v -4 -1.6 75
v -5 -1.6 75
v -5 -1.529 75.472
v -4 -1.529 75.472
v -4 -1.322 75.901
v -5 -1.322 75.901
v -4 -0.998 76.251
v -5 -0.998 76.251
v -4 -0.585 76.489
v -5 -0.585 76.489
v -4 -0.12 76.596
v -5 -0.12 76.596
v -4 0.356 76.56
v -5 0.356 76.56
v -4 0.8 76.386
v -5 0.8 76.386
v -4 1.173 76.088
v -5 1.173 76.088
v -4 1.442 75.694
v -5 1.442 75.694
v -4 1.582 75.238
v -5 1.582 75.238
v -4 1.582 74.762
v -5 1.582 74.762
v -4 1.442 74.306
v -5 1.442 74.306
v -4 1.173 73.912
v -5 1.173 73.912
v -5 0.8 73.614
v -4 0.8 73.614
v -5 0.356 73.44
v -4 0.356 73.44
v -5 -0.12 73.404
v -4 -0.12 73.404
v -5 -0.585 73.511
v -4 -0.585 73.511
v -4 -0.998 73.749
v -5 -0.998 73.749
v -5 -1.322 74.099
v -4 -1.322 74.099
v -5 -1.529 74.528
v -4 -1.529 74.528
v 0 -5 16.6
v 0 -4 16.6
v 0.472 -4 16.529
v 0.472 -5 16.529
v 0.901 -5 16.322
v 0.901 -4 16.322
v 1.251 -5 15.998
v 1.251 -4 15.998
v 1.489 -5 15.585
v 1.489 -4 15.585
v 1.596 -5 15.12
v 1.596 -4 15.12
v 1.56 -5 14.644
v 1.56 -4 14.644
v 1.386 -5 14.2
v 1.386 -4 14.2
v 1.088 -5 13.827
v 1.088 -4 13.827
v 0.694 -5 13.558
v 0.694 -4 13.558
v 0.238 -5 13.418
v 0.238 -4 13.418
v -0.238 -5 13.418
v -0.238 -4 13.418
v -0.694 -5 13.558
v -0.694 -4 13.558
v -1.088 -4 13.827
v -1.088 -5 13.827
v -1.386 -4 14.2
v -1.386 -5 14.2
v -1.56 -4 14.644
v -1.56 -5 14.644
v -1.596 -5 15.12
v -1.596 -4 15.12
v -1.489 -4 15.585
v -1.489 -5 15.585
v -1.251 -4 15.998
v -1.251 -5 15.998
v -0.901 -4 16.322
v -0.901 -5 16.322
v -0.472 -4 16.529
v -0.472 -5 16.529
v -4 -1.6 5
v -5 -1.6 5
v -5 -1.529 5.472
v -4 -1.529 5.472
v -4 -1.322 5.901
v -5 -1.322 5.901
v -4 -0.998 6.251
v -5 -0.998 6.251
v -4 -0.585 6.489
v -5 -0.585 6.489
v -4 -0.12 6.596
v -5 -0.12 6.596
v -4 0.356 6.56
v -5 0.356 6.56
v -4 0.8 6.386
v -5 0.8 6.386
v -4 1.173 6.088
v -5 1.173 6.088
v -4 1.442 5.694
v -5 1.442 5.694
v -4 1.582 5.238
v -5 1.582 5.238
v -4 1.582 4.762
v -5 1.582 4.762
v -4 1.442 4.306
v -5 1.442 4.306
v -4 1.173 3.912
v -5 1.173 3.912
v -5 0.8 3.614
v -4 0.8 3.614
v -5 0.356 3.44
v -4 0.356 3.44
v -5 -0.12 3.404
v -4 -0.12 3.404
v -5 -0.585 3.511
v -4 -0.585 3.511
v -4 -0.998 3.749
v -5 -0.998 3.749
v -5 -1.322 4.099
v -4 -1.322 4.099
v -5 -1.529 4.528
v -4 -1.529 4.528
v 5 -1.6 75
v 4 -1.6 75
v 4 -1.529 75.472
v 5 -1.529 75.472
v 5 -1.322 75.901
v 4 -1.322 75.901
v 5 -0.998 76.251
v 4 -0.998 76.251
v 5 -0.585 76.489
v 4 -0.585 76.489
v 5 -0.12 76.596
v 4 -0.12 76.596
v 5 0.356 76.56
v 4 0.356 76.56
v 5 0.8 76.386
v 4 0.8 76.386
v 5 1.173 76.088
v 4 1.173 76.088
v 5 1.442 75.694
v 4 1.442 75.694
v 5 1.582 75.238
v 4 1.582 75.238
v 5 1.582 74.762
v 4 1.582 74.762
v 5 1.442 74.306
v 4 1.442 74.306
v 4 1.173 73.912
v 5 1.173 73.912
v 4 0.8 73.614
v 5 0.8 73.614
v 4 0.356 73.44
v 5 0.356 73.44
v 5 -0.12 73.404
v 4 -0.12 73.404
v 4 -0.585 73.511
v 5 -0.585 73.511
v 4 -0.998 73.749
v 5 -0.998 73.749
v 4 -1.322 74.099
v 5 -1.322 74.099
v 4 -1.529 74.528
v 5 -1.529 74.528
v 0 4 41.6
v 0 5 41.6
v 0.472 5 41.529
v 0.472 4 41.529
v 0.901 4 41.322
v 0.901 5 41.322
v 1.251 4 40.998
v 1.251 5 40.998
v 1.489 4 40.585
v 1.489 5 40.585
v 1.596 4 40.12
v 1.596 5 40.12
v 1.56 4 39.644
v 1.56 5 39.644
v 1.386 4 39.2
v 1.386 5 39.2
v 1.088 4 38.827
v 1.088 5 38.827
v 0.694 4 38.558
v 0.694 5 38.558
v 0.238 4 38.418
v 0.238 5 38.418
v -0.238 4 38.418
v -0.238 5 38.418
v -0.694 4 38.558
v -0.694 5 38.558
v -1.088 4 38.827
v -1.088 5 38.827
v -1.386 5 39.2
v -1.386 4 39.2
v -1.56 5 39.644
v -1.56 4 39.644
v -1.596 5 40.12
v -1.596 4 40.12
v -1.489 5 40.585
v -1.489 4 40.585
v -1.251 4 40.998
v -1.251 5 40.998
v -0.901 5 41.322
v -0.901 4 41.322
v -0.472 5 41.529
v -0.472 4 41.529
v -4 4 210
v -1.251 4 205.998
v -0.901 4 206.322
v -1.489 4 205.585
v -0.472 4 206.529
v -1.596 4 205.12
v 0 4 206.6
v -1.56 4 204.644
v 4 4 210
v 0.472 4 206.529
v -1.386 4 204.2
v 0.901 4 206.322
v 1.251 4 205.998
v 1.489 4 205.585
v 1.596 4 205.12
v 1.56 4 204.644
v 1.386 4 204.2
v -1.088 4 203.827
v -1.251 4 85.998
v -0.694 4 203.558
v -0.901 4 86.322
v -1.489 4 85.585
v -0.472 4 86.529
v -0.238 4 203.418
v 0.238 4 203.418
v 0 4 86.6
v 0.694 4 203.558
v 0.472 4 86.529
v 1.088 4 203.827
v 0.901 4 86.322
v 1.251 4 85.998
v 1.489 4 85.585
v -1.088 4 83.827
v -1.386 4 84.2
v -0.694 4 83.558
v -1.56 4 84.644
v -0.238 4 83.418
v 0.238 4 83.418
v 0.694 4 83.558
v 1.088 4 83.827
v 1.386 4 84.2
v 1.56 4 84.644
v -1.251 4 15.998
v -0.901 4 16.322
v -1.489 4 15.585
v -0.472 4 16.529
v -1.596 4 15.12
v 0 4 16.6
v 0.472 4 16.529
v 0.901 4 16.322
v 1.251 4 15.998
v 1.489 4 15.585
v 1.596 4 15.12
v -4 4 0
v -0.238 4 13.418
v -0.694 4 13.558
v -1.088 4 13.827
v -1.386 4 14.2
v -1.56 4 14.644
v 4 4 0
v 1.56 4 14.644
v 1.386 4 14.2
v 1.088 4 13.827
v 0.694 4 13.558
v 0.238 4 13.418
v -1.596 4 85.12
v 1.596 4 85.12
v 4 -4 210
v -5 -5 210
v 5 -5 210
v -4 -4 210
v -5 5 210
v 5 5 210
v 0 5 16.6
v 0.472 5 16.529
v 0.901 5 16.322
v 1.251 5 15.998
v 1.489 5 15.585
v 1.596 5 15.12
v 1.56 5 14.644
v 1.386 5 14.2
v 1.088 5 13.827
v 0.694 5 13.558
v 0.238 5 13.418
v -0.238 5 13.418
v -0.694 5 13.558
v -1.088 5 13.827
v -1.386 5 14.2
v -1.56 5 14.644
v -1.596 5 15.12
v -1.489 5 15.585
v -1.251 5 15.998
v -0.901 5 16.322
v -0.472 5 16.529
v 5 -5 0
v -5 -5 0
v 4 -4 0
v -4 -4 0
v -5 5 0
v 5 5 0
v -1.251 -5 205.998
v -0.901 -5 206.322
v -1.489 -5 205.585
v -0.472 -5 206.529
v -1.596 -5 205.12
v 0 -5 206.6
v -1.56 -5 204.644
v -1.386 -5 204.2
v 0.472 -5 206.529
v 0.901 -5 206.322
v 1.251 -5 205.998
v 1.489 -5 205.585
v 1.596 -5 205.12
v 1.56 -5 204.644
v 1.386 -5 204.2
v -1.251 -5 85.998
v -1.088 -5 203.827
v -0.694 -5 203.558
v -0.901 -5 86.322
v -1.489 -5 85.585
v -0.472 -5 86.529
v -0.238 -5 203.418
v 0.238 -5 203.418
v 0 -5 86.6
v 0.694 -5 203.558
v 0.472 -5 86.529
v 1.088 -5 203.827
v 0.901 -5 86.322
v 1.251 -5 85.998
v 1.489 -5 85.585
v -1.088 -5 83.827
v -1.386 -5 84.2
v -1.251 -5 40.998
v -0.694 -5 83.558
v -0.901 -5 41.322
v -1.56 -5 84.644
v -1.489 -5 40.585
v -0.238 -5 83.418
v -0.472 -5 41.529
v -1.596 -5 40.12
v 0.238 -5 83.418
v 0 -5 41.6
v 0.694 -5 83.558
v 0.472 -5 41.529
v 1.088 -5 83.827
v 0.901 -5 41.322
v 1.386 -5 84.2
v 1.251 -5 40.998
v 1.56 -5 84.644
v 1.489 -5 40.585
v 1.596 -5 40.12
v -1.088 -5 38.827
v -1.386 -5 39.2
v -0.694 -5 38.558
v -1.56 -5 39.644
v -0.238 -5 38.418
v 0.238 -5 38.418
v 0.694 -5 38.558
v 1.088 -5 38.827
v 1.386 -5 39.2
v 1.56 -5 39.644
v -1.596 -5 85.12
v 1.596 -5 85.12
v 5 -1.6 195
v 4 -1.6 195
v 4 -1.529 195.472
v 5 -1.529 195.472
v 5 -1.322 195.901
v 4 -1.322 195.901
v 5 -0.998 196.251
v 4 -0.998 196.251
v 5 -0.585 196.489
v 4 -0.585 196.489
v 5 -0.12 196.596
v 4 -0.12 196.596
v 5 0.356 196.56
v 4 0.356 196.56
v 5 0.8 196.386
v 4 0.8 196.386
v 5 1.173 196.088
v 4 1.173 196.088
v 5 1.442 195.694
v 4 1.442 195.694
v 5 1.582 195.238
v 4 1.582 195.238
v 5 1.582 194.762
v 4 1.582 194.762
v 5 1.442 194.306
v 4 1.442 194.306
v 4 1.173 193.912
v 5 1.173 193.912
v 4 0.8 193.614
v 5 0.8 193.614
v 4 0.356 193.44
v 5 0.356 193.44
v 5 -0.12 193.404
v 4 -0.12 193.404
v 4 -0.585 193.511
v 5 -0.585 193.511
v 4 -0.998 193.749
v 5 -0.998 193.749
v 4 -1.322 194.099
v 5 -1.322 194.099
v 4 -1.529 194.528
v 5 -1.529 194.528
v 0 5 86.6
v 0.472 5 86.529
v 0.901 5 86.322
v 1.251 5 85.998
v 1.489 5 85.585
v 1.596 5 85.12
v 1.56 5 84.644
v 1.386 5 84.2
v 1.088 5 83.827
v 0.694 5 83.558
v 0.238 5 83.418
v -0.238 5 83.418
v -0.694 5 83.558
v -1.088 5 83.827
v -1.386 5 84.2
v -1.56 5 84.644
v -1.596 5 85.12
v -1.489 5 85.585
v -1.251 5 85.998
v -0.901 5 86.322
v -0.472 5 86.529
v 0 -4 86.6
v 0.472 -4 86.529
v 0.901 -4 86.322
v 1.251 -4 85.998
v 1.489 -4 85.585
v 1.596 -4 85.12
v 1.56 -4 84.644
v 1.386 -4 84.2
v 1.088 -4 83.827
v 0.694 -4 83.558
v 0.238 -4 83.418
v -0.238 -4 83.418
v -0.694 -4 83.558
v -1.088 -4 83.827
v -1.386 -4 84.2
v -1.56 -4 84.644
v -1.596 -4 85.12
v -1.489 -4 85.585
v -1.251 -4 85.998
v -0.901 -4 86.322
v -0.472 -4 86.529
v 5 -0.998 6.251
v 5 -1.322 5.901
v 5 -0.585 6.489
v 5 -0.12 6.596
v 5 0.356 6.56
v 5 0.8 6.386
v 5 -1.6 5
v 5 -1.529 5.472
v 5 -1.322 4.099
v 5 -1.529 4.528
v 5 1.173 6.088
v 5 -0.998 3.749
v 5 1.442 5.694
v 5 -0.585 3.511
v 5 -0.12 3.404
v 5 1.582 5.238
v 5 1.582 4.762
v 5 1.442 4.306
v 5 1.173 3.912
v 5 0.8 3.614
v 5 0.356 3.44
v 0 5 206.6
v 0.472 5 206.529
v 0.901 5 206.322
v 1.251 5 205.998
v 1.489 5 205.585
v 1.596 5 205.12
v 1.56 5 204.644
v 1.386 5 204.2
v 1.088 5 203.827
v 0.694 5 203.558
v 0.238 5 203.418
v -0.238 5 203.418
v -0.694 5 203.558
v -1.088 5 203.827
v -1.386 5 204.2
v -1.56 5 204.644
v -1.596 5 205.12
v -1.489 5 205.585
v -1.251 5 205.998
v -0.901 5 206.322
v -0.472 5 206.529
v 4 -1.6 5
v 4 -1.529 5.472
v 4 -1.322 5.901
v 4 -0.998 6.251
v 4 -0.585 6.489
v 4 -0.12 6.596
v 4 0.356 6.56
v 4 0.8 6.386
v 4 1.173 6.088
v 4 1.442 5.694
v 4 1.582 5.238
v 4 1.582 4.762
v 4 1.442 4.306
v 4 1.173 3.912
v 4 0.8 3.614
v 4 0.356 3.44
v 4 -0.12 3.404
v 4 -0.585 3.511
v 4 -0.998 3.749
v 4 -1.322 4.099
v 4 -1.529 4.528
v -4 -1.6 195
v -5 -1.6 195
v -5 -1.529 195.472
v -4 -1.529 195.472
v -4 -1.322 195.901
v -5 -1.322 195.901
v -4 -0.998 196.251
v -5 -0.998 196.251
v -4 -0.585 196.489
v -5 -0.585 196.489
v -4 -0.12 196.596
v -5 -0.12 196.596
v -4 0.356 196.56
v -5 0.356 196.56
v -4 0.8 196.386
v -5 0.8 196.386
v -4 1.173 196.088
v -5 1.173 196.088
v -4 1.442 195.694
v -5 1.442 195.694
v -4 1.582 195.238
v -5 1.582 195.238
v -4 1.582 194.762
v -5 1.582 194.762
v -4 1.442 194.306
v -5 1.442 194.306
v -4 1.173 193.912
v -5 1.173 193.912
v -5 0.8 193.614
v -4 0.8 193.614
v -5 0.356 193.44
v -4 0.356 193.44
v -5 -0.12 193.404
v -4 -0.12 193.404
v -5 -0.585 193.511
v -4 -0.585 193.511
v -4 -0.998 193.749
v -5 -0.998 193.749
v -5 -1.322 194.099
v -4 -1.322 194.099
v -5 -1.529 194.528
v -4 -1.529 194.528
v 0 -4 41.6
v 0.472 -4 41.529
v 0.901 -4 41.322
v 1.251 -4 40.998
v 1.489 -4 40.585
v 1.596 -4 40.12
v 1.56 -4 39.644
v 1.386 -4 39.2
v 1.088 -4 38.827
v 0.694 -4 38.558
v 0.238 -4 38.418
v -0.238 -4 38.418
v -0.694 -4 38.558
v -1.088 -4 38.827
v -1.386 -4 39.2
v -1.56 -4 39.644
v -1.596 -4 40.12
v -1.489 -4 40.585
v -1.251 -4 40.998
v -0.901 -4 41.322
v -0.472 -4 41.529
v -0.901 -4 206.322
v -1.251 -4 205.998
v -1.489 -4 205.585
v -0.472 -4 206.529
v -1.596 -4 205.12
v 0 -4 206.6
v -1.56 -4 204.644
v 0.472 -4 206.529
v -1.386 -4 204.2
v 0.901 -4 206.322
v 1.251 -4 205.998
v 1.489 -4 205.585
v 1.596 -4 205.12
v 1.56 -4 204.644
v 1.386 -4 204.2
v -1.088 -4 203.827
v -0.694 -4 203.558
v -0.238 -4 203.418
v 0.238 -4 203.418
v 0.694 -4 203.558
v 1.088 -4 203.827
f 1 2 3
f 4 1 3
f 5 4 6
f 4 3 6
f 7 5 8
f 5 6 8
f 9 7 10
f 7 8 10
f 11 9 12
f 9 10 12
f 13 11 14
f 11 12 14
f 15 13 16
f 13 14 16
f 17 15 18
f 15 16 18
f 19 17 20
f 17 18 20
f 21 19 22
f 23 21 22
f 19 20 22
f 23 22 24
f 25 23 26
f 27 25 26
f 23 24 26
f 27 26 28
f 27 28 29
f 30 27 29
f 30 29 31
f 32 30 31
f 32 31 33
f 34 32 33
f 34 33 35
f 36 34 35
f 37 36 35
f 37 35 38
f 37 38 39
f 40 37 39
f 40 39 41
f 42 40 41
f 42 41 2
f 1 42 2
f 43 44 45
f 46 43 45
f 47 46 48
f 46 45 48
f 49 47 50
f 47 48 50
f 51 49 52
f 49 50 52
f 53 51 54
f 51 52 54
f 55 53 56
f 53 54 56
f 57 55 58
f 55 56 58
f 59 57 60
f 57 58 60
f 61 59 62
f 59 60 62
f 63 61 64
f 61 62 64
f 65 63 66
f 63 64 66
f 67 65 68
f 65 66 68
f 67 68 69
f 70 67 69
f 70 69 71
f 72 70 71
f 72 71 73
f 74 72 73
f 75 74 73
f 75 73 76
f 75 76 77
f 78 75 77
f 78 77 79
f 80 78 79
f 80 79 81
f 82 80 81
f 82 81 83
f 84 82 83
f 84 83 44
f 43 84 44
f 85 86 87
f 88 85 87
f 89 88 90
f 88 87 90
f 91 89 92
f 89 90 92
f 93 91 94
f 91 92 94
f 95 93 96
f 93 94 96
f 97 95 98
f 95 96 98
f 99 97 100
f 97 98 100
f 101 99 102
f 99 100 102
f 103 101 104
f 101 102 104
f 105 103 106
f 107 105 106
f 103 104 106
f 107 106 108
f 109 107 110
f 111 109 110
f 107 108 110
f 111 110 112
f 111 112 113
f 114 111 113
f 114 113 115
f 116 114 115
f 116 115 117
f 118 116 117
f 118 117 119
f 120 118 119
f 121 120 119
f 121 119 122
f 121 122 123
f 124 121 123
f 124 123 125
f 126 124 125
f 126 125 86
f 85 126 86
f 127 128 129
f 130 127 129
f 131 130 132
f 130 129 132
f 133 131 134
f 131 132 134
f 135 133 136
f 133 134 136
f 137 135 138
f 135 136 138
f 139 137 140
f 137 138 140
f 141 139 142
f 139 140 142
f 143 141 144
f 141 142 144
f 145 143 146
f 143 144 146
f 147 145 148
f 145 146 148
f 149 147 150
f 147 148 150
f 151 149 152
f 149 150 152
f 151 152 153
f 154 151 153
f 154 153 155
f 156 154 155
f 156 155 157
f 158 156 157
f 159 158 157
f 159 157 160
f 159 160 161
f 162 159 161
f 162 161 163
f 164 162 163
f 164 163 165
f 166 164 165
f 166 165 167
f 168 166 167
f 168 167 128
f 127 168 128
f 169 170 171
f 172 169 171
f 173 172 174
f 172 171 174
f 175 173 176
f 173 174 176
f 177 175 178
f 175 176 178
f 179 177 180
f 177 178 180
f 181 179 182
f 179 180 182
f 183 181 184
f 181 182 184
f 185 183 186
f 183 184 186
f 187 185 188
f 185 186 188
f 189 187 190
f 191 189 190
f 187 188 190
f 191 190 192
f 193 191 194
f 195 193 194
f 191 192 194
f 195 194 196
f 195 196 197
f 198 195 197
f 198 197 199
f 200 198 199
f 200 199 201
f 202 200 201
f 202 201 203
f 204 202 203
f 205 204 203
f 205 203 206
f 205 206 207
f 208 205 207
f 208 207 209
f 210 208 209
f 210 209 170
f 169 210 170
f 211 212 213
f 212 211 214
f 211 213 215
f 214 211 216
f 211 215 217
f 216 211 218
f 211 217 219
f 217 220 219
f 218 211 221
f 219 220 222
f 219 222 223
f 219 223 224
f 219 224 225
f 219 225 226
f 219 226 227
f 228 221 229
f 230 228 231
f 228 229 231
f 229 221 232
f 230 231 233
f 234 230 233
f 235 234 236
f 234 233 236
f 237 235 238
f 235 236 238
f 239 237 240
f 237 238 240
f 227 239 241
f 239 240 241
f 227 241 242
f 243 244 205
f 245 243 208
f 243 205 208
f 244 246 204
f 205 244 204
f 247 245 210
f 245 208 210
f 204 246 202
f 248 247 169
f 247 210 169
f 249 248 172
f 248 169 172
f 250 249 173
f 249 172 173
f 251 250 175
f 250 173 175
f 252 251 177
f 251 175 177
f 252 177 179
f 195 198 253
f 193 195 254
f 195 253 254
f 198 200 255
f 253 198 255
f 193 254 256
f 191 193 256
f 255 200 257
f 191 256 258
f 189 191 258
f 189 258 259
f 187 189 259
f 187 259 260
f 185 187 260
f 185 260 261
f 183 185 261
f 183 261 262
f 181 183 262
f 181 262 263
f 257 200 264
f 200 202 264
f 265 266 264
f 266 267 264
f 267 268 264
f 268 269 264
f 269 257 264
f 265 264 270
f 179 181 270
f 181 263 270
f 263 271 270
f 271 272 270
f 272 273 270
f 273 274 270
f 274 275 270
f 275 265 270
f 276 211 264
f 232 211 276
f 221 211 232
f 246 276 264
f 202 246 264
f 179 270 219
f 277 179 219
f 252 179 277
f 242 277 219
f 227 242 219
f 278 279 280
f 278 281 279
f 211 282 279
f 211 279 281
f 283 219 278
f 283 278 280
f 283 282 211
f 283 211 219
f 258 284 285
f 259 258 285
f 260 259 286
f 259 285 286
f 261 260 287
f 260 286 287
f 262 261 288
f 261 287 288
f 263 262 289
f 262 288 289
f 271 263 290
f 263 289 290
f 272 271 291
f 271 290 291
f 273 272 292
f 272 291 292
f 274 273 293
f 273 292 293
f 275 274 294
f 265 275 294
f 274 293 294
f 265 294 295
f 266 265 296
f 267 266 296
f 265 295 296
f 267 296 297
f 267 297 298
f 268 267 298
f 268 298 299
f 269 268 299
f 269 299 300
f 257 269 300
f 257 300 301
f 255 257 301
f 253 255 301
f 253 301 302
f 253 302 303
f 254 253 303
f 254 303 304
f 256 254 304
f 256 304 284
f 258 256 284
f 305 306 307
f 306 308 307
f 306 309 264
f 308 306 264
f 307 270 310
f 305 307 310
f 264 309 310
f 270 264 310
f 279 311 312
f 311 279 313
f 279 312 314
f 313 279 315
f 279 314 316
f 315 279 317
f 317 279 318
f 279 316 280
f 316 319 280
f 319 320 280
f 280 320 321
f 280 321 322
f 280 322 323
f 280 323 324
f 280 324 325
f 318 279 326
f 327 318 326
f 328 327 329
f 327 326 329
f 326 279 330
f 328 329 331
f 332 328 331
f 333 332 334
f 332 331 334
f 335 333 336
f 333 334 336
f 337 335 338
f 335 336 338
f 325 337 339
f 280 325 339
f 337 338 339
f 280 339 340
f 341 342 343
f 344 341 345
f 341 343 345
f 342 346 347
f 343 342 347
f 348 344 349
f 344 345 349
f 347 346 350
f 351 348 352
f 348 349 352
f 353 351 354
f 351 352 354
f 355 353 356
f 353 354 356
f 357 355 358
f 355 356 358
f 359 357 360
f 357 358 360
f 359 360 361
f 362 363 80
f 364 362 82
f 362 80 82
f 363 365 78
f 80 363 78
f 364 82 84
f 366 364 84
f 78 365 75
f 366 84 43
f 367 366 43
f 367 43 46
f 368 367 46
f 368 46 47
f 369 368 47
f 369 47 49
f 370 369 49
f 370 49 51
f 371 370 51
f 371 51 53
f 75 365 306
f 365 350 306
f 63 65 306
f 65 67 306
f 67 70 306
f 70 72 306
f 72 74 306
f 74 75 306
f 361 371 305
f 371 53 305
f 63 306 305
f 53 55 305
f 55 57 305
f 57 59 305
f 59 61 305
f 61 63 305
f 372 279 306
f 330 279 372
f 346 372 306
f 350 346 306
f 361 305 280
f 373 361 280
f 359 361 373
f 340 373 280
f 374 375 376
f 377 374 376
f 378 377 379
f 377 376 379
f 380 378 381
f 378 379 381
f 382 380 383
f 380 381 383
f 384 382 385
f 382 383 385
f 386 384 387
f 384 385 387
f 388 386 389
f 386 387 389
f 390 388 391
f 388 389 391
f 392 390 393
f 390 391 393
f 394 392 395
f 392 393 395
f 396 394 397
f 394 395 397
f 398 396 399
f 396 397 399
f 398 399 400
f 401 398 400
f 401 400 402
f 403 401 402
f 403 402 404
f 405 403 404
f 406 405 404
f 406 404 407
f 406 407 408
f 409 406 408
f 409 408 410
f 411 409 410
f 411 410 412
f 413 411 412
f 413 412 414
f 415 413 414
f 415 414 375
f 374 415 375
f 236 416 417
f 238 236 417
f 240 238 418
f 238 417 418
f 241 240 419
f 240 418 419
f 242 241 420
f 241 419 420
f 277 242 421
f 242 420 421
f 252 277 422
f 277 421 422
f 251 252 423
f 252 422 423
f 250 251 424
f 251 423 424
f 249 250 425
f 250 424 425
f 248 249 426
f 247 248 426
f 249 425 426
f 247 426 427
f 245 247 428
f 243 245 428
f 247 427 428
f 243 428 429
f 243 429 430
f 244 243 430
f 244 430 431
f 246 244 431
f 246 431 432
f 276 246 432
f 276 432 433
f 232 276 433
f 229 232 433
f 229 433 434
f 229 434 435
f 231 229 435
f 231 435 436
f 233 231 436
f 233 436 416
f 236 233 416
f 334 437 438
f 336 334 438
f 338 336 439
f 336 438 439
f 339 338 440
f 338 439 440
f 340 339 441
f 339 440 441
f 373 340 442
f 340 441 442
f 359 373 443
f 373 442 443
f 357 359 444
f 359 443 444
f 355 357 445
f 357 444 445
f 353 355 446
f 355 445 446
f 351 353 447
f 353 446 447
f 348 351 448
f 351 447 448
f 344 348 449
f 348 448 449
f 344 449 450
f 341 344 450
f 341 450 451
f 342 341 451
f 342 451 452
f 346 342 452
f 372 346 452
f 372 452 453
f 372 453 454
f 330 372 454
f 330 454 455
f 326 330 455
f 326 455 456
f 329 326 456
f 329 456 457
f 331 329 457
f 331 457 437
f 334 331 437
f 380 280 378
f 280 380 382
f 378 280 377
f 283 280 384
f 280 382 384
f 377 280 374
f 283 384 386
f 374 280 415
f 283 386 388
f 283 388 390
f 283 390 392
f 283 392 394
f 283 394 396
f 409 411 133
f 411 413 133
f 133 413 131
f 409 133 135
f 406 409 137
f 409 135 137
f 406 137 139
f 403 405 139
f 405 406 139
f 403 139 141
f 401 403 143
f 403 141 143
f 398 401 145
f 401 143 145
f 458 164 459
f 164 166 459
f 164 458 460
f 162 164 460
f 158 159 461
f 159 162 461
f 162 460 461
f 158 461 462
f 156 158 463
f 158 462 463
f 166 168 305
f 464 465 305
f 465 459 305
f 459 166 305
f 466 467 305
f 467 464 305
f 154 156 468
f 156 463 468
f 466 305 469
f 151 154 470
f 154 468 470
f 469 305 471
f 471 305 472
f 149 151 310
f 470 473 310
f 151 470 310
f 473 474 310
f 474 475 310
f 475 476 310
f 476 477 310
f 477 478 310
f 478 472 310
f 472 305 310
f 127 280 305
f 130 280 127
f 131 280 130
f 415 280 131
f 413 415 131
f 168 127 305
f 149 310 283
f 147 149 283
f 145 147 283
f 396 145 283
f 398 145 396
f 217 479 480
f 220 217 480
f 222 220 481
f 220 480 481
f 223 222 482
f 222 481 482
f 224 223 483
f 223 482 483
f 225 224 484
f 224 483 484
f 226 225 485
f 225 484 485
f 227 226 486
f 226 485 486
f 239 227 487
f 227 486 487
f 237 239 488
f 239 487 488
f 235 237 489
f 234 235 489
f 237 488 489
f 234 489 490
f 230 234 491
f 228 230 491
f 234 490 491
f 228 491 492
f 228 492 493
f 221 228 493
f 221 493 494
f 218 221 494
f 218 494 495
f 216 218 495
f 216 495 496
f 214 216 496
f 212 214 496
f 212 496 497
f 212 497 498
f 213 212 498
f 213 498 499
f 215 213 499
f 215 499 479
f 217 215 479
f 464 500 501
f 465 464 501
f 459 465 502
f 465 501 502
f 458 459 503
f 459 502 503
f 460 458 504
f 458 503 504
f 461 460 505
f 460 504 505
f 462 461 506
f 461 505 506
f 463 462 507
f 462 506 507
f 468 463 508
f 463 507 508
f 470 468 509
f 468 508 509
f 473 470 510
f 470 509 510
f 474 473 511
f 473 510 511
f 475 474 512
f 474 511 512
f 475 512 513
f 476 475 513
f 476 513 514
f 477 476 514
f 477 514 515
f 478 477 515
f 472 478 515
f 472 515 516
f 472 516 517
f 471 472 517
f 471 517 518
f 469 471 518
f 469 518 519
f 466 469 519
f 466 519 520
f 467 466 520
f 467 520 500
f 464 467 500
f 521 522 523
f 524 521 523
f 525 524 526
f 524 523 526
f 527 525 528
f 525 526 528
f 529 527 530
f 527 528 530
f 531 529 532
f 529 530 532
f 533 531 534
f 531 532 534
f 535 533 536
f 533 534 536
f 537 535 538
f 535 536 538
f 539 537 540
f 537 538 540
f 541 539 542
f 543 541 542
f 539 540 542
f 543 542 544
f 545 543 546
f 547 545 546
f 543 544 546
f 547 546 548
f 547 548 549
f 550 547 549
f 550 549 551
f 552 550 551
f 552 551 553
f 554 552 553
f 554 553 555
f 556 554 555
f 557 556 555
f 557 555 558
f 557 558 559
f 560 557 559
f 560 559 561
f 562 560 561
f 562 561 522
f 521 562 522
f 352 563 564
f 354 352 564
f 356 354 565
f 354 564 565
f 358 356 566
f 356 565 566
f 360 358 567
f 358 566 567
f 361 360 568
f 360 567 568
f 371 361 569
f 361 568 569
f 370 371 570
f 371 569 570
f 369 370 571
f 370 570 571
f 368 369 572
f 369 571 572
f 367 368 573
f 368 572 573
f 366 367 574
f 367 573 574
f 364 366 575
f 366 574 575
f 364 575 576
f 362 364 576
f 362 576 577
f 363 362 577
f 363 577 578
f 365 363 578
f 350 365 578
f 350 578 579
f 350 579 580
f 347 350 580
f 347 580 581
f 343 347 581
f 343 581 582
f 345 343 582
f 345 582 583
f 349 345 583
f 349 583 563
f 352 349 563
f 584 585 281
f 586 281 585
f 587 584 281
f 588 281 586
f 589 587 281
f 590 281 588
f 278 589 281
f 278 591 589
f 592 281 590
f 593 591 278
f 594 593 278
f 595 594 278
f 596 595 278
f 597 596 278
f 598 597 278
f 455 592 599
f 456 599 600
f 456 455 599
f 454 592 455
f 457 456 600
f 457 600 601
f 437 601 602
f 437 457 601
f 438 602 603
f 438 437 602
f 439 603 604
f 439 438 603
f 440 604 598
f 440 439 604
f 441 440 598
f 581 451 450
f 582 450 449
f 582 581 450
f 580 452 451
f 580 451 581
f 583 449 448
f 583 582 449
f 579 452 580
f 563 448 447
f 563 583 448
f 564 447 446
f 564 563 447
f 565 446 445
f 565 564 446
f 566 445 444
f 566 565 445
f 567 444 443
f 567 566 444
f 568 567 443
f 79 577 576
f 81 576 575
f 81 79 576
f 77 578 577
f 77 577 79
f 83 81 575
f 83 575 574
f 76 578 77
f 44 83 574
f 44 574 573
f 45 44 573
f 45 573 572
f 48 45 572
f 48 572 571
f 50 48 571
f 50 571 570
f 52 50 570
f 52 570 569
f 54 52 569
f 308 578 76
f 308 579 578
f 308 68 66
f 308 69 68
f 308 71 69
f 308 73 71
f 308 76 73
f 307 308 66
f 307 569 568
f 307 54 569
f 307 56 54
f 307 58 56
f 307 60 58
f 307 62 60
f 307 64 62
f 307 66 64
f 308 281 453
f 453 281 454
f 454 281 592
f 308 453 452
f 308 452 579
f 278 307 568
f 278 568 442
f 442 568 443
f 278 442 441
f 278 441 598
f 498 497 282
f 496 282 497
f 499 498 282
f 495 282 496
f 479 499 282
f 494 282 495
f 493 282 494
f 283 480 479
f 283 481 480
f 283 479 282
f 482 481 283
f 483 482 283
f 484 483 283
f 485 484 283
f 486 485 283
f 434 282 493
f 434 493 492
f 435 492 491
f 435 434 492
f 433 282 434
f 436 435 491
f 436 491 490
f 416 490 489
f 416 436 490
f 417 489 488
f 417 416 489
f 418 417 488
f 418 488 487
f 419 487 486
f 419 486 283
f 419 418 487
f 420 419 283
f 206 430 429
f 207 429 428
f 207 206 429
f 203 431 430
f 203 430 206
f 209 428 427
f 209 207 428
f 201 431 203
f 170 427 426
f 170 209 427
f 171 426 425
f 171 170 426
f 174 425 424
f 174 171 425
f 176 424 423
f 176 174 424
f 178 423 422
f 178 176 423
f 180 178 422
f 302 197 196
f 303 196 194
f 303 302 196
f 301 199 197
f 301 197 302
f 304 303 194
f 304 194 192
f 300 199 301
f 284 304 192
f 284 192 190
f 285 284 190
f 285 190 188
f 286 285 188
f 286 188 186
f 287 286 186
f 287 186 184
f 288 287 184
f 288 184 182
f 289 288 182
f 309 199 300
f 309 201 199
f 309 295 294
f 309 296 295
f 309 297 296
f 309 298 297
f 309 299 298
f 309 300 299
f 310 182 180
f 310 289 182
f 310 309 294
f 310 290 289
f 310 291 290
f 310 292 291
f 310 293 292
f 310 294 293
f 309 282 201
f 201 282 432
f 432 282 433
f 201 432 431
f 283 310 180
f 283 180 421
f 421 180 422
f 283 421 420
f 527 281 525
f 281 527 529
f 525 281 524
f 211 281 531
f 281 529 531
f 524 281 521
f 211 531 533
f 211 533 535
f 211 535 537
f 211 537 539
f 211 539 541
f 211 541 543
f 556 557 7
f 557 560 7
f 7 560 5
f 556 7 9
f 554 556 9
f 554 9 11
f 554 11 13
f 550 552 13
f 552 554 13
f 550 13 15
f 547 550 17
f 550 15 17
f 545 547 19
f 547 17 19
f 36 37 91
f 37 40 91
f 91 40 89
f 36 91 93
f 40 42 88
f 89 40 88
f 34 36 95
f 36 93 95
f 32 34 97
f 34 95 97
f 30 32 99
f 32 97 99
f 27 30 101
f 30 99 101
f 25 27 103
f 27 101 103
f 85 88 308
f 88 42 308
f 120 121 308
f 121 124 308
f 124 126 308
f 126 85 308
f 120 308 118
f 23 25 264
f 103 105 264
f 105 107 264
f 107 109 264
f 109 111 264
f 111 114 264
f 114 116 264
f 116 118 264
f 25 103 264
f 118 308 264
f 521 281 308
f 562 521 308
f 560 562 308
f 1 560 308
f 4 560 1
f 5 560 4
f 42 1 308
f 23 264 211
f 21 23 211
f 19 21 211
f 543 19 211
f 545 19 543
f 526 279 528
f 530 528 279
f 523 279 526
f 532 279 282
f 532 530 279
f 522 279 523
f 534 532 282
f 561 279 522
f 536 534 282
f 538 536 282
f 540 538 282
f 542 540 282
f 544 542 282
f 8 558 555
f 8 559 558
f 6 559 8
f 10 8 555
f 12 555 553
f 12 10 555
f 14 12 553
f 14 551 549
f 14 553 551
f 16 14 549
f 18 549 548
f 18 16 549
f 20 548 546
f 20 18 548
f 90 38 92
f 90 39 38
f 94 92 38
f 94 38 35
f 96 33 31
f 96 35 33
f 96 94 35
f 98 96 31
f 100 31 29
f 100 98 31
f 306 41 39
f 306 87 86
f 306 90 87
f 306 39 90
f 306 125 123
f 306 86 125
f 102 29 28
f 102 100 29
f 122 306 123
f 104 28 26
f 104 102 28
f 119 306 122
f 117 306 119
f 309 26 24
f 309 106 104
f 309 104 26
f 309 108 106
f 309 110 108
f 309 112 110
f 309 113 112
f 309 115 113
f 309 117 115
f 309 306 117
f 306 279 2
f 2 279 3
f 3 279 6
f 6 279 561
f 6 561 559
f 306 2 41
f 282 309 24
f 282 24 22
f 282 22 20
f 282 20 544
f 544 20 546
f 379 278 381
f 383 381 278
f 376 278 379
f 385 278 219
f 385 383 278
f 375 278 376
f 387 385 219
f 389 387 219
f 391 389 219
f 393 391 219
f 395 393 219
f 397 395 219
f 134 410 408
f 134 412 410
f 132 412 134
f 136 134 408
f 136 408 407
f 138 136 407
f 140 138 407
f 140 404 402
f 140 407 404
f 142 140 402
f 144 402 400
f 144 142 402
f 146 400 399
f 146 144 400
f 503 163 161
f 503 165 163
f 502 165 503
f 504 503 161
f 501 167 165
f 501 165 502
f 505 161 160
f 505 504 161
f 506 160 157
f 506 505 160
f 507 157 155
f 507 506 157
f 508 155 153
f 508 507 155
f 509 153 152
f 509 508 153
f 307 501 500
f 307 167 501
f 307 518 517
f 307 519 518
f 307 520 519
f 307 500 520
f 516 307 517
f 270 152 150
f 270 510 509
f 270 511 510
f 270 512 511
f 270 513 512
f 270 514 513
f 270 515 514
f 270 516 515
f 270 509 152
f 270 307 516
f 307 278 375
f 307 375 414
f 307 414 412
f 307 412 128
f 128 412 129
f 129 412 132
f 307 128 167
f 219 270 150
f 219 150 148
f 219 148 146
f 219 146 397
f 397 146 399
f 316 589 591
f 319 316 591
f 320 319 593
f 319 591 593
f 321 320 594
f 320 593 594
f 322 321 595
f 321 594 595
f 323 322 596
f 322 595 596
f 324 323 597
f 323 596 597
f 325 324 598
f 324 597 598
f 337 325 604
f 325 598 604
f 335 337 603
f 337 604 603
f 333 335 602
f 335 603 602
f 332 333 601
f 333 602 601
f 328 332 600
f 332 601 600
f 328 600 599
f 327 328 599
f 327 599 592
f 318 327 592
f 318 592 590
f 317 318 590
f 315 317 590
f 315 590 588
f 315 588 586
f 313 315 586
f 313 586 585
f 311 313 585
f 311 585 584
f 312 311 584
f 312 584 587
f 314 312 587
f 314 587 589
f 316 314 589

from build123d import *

# Parameters (mm, degrees)
SKETCH_1_W          = 10
SKETCH_1_H          = 10
SKETCH_1_W_2        = 8
SKETCH_1_H_2        = 8
EXTRUDE_1_DEPTH     = 210
SKETCH_2_R          = 1.6
CUT_EXTRUDE_1_DEPTH = 211.297408448
SKETCH_3_R          = 1.6
CUT_EXTRUDE_2_DEPTH = 211.297408448
SKETCH_4_R          = 1.6
CUT_EXTRUDE_3_DEPTH = 211.297408448


with BuildPart() as part:
    # ｽｹｯﾁ1 → ﾎﾞｽ - 押し出し1 (new body)
    with BuildSketch(Plane.XY):
        Rectangle(SKETCH_1_W, SKETCH_1_H)
        Rectangle(SKETCH_1_W_2, SKETCH_1_H_2, mode=Mode.SUBTRACT)
    extrude(amount=EXTRUDE_1_DEPTH)

    # ｽｹｯﾁ2 → ｶｯﾄ - 押し出し1 (cut, through all)
    with BuildSketch(Plane.ZY.offset(5)):
        with Locations(Location((5, 0, 0), (0, 0, 270))):
            Circle(SKETCH_2_R)
        with Locations(Location((75, 0, 0), (0, 0, 270))):
            Circle(SKETCH_2_R)
        with Locations(Location((195, 0, 0), (0, 0, 270))):
            Circle(SKETCH_2_R)
    extrude(amount=-CUT_EXTRUDE_1_DEPTH, mode=Mode.SUBTRACT)

    # ｽｹｯﾁ3 → ｶｯﾄ - 押し出し2 (cut, through all)
    with BuildSketch(Plane(origin=(0, 5, 0), x_dir=(1, 0, 0), z_dir=(0, 1, 0))):
        with Locations(Location((0, -15, 0), (0, 0, 270))):
            Circle(SKETCH_3_R)
        with Locations(Location((0, -85, 0), (0, 0, 270))):
            Circle(SKETCH_3_R)
        with Locations(Location((0, -40, 0), (0, 0, 270))):
            Circle(SKETCH_3_R)
    extrude(amount=-CUT_EXTRUDE_2_DEPTH, mode=Mode.SUBTRACT)

    # ｽｹｯﾁ4 → ｶｯﾄ - 押し出し3 (cut, through all)
    with BuildSketch(Plane(origin=(0, 5, 0), x_dir=(1, 0, 0), z_dir=(0, 1, 0))):
        with Locations(Location((0, -205, 0), (0, 0, 270))):
            Circle(SKETCH_4_R)
    extrude(amount=-CUT_EXTRUDE_3_DEPTH, mode=Mode.SUBTRACT)


solid = part.part
